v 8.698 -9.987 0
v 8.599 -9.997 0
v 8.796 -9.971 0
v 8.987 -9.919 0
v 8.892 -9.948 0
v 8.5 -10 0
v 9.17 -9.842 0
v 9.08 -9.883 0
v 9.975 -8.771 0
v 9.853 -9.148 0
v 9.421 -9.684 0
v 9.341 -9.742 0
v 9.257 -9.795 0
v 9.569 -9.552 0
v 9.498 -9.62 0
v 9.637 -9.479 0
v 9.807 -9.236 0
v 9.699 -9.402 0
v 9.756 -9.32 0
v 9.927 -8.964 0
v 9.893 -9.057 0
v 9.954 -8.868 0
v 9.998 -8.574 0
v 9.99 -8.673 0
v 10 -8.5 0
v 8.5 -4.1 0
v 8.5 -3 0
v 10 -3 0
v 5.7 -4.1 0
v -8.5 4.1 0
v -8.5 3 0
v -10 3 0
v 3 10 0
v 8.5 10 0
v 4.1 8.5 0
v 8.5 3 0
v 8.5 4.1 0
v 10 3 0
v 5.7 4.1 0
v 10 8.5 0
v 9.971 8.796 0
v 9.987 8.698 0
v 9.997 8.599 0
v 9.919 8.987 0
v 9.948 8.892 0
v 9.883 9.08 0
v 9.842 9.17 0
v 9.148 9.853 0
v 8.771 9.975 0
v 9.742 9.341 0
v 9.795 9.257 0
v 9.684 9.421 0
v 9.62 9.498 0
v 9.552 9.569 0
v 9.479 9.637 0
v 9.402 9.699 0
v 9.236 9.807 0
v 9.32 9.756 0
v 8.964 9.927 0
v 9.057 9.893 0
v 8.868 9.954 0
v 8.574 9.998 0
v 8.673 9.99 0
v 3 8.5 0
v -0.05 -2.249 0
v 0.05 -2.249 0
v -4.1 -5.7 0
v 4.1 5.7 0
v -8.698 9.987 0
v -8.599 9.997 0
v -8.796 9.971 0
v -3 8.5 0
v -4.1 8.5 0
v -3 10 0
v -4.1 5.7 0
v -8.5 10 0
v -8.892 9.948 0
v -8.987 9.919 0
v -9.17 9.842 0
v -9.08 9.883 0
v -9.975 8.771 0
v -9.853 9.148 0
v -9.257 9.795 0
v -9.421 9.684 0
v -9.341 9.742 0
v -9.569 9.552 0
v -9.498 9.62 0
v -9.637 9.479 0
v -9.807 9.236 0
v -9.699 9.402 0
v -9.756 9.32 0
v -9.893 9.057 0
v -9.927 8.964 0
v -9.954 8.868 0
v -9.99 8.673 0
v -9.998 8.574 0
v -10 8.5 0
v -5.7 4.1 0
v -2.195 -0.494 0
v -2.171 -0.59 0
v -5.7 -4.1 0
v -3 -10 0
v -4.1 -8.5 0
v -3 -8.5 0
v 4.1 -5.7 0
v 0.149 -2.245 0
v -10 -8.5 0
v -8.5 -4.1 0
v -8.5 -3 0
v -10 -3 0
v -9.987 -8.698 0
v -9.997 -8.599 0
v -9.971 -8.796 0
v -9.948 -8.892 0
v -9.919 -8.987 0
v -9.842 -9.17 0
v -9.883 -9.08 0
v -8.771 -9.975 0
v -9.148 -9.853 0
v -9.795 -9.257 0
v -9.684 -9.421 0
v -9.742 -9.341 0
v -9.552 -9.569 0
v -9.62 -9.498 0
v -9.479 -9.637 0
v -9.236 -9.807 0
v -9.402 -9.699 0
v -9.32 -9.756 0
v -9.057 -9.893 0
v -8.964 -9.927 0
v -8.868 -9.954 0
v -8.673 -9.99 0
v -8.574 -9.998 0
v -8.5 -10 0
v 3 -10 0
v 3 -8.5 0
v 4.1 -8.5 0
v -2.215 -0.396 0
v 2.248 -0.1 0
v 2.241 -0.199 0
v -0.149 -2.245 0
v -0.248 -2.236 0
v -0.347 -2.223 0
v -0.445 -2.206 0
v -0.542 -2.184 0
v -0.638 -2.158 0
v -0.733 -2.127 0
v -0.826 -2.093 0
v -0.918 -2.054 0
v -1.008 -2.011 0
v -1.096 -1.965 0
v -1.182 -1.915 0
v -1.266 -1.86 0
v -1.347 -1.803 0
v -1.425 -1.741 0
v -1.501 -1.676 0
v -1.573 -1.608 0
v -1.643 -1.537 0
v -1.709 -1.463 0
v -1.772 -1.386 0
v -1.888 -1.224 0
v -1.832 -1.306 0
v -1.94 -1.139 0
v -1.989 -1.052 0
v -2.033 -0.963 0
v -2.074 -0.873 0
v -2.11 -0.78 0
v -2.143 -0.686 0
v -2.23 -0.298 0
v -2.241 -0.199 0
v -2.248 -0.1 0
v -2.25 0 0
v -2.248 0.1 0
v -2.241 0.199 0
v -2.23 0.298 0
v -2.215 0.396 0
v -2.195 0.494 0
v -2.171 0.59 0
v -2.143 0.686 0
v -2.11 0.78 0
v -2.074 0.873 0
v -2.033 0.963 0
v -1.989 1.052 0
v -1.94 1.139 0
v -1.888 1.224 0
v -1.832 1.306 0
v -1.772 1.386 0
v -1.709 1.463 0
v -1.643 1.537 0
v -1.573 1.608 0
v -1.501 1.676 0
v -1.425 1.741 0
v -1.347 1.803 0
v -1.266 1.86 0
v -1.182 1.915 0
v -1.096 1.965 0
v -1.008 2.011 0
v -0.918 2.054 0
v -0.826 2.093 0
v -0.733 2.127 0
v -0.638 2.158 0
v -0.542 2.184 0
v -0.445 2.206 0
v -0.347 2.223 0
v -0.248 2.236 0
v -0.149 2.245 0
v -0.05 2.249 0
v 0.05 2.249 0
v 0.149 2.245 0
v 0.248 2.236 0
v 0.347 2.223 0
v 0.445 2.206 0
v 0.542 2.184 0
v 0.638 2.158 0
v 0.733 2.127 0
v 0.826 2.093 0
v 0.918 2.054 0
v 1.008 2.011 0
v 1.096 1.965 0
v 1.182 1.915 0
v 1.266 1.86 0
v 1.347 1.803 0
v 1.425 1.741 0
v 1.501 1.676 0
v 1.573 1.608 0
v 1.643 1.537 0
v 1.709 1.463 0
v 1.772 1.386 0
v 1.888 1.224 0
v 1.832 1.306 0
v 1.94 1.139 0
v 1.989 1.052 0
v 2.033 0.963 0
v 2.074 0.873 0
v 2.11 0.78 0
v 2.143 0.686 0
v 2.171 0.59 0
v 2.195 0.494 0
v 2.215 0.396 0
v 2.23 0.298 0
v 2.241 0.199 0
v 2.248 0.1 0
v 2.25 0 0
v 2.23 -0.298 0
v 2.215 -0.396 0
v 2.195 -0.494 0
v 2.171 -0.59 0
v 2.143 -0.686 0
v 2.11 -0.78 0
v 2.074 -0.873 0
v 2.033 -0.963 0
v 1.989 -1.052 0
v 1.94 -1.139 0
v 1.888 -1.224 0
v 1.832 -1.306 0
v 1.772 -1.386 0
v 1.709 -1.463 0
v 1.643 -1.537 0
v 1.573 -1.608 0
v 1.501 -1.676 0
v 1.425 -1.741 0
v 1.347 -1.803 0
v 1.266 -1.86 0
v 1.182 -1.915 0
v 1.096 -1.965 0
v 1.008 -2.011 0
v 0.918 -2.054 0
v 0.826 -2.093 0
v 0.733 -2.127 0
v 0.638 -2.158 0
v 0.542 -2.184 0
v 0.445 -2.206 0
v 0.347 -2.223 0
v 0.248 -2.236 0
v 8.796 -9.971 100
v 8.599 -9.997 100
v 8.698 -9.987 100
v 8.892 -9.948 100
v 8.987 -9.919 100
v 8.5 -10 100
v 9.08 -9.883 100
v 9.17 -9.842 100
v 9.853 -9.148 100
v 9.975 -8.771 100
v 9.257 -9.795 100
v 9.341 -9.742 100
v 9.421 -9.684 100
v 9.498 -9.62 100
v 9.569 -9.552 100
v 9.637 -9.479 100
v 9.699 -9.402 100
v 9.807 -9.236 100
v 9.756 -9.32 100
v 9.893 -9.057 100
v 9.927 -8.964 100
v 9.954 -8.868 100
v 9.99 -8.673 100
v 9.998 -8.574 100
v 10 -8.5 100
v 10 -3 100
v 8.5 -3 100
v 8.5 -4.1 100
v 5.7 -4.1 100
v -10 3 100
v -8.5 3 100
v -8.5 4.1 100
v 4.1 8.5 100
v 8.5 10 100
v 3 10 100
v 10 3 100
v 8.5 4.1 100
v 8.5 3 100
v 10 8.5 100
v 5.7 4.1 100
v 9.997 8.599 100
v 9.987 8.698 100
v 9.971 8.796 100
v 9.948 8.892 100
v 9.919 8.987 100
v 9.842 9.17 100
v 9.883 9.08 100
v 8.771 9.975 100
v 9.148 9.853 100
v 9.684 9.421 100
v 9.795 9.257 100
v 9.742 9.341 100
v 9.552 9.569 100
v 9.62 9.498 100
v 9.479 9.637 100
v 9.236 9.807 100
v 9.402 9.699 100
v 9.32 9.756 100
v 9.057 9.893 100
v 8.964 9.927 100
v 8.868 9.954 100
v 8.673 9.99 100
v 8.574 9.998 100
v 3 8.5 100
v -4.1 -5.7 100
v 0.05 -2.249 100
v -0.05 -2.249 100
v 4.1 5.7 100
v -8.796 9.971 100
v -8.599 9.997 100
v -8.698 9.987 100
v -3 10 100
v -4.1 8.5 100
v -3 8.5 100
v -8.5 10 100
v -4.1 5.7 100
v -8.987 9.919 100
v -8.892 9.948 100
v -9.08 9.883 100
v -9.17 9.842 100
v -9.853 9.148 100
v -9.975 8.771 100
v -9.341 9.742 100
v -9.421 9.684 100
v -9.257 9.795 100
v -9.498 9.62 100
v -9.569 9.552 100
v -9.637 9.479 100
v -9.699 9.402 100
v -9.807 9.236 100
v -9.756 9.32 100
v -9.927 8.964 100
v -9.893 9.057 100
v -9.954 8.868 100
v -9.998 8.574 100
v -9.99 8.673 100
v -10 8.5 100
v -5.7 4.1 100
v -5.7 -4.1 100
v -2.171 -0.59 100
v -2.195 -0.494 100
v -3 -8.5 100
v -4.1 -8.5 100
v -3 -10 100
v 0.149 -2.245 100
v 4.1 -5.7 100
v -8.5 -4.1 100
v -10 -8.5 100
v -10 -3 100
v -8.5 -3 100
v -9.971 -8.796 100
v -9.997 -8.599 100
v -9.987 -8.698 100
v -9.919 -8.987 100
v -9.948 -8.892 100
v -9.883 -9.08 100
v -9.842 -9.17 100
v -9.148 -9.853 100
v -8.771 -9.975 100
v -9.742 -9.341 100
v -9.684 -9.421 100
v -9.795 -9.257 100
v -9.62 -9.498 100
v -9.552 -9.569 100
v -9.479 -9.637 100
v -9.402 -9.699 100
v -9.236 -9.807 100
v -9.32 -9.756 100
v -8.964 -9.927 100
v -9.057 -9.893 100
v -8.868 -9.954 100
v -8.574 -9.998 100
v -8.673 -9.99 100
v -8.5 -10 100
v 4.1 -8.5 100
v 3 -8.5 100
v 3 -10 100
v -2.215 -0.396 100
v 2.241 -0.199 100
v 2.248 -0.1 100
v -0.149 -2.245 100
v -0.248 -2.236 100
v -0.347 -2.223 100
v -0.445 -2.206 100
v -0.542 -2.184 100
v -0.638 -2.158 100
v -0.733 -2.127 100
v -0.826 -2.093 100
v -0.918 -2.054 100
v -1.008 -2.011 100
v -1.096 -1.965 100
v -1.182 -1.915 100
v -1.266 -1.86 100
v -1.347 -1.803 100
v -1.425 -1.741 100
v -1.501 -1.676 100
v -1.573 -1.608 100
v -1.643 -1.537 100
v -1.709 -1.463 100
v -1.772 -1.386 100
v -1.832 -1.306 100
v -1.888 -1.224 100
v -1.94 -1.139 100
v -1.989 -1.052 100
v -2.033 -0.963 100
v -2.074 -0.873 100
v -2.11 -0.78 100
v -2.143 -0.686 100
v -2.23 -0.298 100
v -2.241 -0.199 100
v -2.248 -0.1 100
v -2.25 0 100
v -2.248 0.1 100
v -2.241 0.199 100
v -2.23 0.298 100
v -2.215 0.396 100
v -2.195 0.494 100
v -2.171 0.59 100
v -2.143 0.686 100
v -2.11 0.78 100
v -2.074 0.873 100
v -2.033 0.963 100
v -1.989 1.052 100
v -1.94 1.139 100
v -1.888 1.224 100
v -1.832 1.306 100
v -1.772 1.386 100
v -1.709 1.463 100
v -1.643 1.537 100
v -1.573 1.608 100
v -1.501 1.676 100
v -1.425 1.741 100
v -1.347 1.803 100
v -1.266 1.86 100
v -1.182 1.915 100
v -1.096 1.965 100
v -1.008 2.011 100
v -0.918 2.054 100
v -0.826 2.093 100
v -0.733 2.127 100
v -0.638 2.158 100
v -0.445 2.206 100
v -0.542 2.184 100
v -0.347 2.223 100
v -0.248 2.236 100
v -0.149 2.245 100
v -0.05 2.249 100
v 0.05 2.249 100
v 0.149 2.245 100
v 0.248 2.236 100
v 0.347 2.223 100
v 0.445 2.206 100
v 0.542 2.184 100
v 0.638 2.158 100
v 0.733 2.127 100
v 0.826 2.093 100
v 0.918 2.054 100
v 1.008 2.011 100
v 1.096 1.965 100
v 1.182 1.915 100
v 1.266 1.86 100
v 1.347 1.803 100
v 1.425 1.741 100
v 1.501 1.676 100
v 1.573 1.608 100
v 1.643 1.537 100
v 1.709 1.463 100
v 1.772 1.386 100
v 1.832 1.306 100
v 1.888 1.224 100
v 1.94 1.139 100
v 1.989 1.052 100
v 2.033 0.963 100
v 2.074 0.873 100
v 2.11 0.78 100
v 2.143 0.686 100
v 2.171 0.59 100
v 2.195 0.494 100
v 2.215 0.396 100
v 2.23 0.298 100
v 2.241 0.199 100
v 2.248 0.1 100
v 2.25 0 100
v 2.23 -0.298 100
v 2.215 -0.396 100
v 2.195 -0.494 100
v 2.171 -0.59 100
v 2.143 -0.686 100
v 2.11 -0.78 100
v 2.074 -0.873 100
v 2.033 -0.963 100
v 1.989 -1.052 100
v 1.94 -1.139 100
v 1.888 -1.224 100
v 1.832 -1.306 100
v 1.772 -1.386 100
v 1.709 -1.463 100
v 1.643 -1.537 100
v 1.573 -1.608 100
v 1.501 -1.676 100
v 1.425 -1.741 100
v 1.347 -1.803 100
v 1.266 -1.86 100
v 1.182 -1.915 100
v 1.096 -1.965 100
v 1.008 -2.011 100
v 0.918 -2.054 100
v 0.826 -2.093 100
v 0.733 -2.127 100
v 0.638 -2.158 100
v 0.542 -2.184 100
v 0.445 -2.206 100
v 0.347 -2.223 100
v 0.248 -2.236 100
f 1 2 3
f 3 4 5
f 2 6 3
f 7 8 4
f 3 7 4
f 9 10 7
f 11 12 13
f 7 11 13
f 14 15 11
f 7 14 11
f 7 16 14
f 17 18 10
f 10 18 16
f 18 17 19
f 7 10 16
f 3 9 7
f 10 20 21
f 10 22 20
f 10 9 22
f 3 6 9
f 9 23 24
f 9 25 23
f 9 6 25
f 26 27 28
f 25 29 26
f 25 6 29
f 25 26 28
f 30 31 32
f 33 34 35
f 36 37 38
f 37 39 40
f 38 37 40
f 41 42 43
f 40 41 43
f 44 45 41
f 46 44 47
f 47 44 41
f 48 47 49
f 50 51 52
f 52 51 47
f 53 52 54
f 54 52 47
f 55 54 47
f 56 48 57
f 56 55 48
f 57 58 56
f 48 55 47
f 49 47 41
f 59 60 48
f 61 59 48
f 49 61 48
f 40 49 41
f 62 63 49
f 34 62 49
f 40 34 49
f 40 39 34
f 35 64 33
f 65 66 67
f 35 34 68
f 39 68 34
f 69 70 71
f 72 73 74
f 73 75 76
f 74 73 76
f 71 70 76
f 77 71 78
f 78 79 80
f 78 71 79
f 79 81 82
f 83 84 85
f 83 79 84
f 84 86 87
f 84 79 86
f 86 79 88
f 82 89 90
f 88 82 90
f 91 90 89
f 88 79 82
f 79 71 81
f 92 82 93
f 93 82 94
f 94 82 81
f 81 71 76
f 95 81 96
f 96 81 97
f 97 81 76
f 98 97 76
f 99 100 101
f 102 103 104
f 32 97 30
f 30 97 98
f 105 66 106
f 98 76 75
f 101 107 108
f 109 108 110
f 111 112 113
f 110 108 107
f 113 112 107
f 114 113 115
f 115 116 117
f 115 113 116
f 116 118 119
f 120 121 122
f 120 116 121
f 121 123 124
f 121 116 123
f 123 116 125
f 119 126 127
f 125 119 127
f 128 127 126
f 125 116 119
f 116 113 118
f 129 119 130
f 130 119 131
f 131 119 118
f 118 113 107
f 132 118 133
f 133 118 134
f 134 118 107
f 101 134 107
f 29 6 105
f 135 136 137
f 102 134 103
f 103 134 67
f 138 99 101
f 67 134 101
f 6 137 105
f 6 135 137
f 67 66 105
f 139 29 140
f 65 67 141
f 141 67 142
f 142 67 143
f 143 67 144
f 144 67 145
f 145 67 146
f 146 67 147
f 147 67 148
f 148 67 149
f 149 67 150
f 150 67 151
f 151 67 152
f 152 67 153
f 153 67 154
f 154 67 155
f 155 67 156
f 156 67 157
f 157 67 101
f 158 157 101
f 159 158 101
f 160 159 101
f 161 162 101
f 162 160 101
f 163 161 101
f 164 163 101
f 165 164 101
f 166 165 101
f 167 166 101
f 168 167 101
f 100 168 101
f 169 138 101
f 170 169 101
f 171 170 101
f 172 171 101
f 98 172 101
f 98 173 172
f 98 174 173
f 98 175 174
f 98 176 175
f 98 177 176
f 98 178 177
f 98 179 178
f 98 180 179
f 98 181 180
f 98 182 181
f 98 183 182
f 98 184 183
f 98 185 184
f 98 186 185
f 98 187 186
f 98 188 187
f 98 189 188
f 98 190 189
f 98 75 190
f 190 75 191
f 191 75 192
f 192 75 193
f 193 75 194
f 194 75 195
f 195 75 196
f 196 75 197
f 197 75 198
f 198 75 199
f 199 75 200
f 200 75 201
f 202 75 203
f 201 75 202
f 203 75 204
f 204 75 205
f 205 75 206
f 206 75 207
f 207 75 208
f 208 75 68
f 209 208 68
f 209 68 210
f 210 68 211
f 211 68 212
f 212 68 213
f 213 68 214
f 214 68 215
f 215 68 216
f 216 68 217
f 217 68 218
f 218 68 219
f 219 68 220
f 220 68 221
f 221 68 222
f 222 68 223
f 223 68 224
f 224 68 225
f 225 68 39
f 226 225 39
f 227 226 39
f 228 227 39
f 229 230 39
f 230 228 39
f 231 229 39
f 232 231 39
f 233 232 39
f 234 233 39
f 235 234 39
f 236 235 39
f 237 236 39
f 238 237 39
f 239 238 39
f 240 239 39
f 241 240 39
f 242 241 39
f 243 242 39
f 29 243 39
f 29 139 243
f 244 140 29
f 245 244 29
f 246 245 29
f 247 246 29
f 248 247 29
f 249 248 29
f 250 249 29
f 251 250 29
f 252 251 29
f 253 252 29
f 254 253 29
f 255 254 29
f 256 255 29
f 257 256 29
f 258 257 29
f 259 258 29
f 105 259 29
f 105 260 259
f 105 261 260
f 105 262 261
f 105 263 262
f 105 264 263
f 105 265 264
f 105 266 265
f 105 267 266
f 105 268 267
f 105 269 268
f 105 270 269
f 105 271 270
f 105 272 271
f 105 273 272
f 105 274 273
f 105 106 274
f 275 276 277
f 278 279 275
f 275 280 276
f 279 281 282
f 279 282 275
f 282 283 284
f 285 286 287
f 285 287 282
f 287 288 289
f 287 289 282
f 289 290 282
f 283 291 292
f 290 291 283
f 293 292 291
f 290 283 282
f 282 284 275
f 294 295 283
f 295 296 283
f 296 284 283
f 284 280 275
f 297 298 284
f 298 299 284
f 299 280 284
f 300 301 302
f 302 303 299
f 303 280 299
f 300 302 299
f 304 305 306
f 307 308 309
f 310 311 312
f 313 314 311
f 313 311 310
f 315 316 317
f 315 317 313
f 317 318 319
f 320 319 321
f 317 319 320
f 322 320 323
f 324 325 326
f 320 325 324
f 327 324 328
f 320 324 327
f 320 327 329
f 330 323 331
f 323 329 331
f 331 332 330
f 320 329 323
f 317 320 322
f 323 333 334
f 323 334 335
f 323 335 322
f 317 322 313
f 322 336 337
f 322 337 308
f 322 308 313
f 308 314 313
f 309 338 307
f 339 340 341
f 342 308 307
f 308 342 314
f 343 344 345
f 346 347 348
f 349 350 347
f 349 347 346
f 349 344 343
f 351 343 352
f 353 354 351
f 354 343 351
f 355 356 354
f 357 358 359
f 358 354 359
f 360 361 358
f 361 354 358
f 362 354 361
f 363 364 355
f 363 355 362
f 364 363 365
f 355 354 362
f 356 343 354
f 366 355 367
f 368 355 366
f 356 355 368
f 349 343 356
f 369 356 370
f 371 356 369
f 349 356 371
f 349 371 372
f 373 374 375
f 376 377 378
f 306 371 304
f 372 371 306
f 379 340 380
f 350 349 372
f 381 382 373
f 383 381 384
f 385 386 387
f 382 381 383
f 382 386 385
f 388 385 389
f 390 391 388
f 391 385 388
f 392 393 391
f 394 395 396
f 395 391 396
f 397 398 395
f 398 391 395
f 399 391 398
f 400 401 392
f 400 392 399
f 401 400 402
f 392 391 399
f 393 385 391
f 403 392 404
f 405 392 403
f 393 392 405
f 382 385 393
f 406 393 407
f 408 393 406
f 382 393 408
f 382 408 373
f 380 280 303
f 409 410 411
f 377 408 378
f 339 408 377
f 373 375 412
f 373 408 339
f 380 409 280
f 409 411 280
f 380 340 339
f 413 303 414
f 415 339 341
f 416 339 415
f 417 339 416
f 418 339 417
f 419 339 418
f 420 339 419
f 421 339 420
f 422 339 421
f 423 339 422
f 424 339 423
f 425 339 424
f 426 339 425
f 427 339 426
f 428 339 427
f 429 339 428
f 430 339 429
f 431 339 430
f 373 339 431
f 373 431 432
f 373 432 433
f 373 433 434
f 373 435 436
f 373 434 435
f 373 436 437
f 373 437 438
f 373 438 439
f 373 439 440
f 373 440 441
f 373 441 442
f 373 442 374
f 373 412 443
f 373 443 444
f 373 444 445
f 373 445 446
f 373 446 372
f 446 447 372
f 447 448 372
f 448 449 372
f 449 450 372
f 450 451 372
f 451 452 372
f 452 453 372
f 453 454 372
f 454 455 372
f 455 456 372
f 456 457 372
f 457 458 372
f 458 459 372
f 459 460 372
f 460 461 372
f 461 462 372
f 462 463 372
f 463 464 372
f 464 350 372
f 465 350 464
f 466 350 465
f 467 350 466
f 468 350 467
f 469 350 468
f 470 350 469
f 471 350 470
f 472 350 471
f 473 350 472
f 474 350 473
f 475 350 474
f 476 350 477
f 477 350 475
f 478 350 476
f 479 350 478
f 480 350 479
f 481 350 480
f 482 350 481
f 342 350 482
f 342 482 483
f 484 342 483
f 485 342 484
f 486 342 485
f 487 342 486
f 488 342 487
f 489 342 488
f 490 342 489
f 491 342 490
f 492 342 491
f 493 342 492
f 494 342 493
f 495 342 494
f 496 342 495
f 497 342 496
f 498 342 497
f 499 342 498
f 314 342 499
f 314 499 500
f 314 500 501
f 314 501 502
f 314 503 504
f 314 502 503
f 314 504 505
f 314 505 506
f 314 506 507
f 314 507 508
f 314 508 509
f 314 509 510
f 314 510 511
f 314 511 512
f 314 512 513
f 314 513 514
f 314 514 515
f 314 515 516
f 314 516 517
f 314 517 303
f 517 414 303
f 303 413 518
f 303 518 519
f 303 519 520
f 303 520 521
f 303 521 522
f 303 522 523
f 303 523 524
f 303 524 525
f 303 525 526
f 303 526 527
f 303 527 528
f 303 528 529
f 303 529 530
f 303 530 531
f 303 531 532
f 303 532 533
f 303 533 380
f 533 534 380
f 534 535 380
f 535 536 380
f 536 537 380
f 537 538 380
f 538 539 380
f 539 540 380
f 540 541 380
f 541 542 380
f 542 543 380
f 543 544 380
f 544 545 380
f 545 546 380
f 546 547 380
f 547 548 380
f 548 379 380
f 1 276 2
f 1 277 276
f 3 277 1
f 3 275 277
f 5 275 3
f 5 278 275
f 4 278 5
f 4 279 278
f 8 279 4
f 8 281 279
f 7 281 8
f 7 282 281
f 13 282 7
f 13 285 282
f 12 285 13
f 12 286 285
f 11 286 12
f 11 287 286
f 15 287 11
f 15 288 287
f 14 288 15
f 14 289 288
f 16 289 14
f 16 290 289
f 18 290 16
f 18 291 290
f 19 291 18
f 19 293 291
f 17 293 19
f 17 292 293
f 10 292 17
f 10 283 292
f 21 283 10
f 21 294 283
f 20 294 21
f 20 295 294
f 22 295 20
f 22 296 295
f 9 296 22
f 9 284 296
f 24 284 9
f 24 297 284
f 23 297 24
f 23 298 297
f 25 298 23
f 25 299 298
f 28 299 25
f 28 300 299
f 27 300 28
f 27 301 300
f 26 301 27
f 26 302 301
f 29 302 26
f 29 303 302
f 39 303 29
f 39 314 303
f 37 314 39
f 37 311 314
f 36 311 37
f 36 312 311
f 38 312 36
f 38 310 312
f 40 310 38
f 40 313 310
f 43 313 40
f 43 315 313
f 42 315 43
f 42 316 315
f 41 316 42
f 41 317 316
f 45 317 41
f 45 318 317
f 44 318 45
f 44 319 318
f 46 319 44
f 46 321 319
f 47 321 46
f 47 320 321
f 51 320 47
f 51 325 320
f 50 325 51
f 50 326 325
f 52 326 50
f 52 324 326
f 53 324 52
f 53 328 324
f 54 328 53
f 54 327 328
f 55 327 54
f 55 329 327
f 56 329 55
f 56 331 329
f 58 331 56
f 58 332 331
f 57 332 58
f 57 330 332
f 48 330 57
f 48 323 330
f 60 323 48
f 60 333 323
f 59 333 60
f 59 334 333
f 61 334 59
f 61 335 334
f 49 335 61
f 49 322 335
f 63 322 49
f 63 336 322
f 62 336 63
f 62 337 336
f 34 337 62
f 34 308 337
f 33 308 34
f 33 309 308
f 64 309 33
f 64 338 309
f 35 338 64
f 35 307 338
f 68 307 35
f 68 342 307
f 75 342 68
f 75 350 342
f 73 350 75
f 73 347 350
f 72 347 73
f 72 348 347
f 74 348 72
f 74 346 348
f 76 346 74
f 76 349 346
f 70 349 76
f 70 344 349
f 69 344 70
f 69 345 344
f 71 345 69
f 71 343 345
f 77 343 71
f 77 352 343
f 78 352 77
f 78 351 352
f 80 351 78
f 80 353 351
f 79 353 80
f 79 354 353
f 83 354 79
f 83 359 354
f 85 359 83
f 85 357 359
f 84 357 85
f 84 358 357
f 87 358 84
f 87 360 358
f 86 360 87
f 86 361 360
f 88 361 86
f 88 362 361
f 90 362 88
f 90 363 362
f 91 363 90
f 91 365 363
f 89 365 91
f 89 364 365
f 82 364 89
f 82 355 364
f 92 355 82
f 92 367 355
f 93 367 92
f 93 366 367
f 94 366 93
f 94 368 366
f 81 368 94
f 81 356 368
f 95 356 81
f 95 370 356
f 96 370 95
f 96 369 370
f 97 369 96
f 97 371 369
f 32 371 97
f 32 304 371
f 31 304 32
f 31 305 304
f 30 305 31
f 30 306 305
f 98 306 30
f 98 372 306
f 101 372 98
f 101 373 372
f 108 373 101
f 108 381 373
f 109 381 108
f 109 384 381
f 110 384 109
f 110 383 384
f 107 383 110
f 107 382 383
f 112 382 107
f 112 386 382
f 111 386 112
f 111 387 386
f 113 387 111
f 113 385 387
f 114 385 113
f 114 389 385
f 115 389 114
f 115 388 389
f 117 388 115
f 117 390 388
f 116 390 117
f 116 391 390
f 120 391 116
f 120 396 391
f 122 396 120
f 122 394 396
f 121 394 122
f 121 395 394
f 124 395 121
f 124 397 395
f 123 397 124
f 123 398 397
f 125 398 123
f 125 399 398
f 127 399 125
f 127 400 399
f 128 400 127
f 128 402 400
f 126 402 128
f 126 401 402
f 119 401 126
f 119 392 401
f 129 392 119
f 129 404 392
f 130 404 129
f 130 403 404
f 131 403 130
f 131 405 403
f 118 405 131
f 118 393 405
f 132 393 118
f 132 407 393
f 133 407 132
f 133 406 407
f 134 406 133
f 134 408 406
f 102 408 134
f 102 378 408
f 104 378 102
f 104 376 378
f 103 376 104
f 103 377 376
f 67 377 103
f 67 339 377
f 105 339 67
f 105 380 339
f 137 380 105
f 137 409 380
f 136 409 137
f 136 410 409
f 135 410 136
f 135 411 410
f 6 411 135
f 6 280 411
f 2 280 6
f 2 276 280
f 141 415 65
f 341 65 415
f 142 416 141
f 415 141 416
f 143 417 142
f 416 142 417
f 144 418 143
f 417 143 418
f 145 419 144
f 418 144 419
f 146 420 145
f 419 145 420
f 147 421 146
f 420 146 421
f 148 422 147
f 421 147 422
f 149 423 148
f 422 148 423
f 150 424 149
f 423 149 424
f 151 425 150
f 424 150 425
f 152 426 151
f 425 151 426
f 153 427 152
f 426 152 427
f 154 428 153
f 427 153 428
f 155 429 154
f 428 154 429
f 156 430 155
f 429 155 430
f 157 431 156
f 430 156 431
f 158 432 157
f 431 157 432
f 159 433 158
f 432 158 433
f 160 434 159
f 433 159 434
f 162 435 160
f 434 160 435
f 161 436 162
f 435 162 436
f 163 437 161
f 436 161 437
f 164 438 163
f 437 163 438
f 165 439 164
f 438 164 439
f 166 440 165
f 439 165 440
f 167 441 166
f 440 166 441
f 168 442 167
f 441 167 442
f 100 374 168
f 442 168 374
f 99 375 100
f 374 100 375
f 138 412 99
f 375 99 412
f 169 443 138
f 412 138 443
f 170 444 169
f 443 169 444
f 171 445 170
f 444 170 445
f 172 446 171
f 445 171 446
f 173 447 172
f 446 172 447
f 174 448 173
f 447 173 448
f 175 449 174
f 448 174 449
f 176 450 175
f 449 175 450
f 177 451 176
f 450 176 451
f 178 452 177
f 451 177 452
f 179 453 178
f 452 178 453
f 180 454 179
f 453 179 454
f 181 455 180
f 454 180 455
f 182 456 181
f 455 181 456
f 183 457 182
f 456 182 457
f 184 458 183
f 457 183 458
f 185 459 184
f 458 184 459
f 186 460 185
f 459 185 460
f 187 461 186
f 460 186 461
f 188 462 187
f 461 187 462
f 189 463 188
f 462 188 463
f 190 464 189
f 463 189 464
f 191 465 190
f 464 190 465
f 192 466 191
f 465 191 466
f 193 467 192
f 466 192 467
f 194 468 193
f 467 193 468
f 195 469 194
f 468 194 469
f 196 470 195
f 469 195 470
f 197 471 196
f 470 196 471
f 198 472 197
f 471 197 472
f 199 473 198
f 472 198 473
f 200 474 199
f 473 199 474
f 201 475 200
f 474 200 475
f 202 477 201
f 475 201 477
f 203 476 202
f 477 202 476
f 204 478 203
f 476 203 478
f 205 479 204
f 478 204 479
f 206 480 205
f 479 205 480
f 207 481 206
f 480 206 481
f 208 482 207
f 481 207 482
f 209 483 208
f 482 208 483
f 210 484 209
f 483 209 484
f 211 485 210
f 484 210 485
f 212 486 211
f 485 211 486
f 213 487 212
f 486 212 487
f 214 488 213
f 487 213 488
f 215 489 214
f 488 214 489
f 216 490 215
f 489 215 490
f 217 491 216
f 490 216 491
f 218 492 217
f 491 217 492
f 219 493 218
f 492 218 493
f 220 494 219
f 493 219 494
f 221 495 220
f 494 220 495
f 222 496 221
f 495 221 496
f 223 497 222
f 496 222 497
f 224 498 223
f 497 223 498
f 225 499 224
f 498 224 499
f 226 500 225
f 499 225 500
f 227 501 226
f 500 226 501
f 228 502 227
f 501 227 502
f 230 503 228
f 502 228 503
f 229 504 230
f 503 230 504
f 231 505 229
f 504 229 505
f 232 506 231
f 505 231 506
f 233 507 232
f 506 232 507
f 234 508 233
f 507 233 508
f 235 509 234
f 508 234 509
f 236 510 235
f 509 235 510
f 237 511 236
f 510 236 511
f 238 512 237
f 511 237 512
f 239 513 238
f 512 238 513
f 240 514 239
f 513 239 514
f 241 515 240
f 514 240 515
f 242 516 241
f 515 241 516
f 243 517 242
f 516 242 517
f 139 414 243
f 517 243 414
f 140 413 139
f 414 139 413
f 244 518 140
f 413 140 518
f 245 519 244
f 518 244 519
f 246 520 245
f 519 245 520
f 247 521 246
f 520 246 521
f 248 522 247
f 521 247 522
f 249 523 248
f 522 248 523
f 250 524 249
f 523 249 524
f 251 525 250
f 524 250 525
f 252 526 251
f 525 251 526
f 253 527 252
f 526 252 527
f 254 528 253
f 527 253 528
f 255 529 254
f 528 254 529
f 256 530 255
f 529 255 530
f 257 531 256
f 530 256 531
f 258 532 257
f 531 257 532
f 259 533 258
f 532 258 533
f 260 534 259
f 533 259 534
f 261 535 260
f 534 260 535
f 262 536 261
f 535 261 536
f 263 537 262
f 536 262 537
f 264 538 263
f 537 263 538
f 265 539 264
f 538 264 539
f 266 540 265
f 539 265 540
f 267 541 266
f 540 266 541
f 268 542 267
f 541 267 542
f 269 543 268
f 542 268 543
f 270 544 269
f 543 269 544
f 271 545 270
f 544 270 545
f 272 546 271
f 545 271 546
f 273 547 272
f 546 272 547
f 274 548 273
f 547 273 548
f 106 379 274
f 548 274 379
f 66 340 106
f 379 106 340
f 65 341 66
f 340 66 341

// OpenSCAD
/**
 * 2020 Aluminum T-Slot Extrusion Profile
 *
 * Provides a parametric 2020 T-slot aluminum extrusion shape for use
 * in assembly models and clearance calculations.
 *
 * Public modules:
 *   extrusion_2020_profile_2d()          — 2D cross-section, centered at origin;
 *                                          useful with linear_extrude for custom orientations.
 *   extrusion_2020(length, axis)         — 3D extrusion from 0 to `length` along
 *                                          "x", "y", or "z" (default "z").
 *
 * Usage from another file:
 *   use <../common/2020-extrusion.scad>
 *   extrusion_2020(length = 320, axis = "x");
 */

$fa = 1.0;
$fs = 0.1;

// --- Configurable dimensions (all values in mm) ---
extrusion_size       = 20.0;  // Overall cross-section width and height
corner_radius        = 1.5;   // Outer corner fillet radius
slot_opening_width   = 6.0;   // T-slot mouth width at the extrusion face
slot_cavity_width    = 8.2;   // T-slot internal nut groove width
slot_total_depth     = 4.3;   // Total T-slot depth from face inward
slot_lip_depth       = 1.5;   // Depth of narrow mouth before it widens
center_hole_dia      = 4.5;   // Central M4 through-hole diameter

// --- Internal derived values ---
_face         = extrusion_size / 2;
_lip_end      = _face - slot_lip_depth;
_cavity_end   = _face - slot_total_depth;
_half_opening = slot_opening_width / 2;
_half_cavity  = slot_cavity_width / 2;

// Internal: 2D profile of a single T-slot channel.
// The slot opening faces the +X direction.
module _tslot_2d() {
    polygon(points = [
        [_face + 0.1,  _half_opening],
        [_lip_end,     _half_opening],
        [_lip_end,     _half_cavity],
        [_cavity_end,  _half_cavity],
        [_cavity_end, -_half_cavity],
        [_lip_end,    -_half_cavity],
        [_lip_end,    -_half_opening],
        [_face + 0.1, -_half_opening]
    ]);
}

// 2D cross-section of a 2020 extrusion, centered at origin.
// Suitable for use with linear_extrude in custom orientations.
module extrusion_2020_profile_2d() {
    difference() {
        // Rounded outer square
        offset(r = corner_radius)
            square(
                [extrusion_size - 2 * corner_radius,
                 extrusion_size - 2 * corner_radius],
                center = true
            );

        // T-slot channels on all four faces
        _tslot_2d();                         // +X face
        rotate([0, 0,  90]) _tslot_2d();    // +Y face
        rotate([0, 0, 180]) _tslot_2d();    // -X face
        rotate([0, 0, 270]) _tslot_2d();    // -Y face

        // Central M4 through-hole
        circle(d = center_hole_dia);
    }
}

// 3D 2020 extrusion of the given length along the specified axis.
// The solid runs from 0 to `length` along the chosen axis.
//
// Parameters:
//   length  — extrusion length in mm (default 100)
//   axis    — orientation: "x", "y", or "z" (default "z")
module extrusion_2020(length = 100, axis = "z") {
    if (axis == "z") {
        linear_extrude(height = length)
            extrusion_2020_profile_2d();
    } else if (axis == "x") {
        rotate([0, 90, 0])
            linear_extrude(height = length)
                extrusion_2020_profile_2d();
    } else if (axis == "y") {
        rotate([-90, 0, 0])
            linear_extrude(height = length)
                extrusion_2020_profile_2d();
    }
}

// --- Preview output (comment out when using as a library) ---
extrusion_2020(length = 100, axis = "z");
